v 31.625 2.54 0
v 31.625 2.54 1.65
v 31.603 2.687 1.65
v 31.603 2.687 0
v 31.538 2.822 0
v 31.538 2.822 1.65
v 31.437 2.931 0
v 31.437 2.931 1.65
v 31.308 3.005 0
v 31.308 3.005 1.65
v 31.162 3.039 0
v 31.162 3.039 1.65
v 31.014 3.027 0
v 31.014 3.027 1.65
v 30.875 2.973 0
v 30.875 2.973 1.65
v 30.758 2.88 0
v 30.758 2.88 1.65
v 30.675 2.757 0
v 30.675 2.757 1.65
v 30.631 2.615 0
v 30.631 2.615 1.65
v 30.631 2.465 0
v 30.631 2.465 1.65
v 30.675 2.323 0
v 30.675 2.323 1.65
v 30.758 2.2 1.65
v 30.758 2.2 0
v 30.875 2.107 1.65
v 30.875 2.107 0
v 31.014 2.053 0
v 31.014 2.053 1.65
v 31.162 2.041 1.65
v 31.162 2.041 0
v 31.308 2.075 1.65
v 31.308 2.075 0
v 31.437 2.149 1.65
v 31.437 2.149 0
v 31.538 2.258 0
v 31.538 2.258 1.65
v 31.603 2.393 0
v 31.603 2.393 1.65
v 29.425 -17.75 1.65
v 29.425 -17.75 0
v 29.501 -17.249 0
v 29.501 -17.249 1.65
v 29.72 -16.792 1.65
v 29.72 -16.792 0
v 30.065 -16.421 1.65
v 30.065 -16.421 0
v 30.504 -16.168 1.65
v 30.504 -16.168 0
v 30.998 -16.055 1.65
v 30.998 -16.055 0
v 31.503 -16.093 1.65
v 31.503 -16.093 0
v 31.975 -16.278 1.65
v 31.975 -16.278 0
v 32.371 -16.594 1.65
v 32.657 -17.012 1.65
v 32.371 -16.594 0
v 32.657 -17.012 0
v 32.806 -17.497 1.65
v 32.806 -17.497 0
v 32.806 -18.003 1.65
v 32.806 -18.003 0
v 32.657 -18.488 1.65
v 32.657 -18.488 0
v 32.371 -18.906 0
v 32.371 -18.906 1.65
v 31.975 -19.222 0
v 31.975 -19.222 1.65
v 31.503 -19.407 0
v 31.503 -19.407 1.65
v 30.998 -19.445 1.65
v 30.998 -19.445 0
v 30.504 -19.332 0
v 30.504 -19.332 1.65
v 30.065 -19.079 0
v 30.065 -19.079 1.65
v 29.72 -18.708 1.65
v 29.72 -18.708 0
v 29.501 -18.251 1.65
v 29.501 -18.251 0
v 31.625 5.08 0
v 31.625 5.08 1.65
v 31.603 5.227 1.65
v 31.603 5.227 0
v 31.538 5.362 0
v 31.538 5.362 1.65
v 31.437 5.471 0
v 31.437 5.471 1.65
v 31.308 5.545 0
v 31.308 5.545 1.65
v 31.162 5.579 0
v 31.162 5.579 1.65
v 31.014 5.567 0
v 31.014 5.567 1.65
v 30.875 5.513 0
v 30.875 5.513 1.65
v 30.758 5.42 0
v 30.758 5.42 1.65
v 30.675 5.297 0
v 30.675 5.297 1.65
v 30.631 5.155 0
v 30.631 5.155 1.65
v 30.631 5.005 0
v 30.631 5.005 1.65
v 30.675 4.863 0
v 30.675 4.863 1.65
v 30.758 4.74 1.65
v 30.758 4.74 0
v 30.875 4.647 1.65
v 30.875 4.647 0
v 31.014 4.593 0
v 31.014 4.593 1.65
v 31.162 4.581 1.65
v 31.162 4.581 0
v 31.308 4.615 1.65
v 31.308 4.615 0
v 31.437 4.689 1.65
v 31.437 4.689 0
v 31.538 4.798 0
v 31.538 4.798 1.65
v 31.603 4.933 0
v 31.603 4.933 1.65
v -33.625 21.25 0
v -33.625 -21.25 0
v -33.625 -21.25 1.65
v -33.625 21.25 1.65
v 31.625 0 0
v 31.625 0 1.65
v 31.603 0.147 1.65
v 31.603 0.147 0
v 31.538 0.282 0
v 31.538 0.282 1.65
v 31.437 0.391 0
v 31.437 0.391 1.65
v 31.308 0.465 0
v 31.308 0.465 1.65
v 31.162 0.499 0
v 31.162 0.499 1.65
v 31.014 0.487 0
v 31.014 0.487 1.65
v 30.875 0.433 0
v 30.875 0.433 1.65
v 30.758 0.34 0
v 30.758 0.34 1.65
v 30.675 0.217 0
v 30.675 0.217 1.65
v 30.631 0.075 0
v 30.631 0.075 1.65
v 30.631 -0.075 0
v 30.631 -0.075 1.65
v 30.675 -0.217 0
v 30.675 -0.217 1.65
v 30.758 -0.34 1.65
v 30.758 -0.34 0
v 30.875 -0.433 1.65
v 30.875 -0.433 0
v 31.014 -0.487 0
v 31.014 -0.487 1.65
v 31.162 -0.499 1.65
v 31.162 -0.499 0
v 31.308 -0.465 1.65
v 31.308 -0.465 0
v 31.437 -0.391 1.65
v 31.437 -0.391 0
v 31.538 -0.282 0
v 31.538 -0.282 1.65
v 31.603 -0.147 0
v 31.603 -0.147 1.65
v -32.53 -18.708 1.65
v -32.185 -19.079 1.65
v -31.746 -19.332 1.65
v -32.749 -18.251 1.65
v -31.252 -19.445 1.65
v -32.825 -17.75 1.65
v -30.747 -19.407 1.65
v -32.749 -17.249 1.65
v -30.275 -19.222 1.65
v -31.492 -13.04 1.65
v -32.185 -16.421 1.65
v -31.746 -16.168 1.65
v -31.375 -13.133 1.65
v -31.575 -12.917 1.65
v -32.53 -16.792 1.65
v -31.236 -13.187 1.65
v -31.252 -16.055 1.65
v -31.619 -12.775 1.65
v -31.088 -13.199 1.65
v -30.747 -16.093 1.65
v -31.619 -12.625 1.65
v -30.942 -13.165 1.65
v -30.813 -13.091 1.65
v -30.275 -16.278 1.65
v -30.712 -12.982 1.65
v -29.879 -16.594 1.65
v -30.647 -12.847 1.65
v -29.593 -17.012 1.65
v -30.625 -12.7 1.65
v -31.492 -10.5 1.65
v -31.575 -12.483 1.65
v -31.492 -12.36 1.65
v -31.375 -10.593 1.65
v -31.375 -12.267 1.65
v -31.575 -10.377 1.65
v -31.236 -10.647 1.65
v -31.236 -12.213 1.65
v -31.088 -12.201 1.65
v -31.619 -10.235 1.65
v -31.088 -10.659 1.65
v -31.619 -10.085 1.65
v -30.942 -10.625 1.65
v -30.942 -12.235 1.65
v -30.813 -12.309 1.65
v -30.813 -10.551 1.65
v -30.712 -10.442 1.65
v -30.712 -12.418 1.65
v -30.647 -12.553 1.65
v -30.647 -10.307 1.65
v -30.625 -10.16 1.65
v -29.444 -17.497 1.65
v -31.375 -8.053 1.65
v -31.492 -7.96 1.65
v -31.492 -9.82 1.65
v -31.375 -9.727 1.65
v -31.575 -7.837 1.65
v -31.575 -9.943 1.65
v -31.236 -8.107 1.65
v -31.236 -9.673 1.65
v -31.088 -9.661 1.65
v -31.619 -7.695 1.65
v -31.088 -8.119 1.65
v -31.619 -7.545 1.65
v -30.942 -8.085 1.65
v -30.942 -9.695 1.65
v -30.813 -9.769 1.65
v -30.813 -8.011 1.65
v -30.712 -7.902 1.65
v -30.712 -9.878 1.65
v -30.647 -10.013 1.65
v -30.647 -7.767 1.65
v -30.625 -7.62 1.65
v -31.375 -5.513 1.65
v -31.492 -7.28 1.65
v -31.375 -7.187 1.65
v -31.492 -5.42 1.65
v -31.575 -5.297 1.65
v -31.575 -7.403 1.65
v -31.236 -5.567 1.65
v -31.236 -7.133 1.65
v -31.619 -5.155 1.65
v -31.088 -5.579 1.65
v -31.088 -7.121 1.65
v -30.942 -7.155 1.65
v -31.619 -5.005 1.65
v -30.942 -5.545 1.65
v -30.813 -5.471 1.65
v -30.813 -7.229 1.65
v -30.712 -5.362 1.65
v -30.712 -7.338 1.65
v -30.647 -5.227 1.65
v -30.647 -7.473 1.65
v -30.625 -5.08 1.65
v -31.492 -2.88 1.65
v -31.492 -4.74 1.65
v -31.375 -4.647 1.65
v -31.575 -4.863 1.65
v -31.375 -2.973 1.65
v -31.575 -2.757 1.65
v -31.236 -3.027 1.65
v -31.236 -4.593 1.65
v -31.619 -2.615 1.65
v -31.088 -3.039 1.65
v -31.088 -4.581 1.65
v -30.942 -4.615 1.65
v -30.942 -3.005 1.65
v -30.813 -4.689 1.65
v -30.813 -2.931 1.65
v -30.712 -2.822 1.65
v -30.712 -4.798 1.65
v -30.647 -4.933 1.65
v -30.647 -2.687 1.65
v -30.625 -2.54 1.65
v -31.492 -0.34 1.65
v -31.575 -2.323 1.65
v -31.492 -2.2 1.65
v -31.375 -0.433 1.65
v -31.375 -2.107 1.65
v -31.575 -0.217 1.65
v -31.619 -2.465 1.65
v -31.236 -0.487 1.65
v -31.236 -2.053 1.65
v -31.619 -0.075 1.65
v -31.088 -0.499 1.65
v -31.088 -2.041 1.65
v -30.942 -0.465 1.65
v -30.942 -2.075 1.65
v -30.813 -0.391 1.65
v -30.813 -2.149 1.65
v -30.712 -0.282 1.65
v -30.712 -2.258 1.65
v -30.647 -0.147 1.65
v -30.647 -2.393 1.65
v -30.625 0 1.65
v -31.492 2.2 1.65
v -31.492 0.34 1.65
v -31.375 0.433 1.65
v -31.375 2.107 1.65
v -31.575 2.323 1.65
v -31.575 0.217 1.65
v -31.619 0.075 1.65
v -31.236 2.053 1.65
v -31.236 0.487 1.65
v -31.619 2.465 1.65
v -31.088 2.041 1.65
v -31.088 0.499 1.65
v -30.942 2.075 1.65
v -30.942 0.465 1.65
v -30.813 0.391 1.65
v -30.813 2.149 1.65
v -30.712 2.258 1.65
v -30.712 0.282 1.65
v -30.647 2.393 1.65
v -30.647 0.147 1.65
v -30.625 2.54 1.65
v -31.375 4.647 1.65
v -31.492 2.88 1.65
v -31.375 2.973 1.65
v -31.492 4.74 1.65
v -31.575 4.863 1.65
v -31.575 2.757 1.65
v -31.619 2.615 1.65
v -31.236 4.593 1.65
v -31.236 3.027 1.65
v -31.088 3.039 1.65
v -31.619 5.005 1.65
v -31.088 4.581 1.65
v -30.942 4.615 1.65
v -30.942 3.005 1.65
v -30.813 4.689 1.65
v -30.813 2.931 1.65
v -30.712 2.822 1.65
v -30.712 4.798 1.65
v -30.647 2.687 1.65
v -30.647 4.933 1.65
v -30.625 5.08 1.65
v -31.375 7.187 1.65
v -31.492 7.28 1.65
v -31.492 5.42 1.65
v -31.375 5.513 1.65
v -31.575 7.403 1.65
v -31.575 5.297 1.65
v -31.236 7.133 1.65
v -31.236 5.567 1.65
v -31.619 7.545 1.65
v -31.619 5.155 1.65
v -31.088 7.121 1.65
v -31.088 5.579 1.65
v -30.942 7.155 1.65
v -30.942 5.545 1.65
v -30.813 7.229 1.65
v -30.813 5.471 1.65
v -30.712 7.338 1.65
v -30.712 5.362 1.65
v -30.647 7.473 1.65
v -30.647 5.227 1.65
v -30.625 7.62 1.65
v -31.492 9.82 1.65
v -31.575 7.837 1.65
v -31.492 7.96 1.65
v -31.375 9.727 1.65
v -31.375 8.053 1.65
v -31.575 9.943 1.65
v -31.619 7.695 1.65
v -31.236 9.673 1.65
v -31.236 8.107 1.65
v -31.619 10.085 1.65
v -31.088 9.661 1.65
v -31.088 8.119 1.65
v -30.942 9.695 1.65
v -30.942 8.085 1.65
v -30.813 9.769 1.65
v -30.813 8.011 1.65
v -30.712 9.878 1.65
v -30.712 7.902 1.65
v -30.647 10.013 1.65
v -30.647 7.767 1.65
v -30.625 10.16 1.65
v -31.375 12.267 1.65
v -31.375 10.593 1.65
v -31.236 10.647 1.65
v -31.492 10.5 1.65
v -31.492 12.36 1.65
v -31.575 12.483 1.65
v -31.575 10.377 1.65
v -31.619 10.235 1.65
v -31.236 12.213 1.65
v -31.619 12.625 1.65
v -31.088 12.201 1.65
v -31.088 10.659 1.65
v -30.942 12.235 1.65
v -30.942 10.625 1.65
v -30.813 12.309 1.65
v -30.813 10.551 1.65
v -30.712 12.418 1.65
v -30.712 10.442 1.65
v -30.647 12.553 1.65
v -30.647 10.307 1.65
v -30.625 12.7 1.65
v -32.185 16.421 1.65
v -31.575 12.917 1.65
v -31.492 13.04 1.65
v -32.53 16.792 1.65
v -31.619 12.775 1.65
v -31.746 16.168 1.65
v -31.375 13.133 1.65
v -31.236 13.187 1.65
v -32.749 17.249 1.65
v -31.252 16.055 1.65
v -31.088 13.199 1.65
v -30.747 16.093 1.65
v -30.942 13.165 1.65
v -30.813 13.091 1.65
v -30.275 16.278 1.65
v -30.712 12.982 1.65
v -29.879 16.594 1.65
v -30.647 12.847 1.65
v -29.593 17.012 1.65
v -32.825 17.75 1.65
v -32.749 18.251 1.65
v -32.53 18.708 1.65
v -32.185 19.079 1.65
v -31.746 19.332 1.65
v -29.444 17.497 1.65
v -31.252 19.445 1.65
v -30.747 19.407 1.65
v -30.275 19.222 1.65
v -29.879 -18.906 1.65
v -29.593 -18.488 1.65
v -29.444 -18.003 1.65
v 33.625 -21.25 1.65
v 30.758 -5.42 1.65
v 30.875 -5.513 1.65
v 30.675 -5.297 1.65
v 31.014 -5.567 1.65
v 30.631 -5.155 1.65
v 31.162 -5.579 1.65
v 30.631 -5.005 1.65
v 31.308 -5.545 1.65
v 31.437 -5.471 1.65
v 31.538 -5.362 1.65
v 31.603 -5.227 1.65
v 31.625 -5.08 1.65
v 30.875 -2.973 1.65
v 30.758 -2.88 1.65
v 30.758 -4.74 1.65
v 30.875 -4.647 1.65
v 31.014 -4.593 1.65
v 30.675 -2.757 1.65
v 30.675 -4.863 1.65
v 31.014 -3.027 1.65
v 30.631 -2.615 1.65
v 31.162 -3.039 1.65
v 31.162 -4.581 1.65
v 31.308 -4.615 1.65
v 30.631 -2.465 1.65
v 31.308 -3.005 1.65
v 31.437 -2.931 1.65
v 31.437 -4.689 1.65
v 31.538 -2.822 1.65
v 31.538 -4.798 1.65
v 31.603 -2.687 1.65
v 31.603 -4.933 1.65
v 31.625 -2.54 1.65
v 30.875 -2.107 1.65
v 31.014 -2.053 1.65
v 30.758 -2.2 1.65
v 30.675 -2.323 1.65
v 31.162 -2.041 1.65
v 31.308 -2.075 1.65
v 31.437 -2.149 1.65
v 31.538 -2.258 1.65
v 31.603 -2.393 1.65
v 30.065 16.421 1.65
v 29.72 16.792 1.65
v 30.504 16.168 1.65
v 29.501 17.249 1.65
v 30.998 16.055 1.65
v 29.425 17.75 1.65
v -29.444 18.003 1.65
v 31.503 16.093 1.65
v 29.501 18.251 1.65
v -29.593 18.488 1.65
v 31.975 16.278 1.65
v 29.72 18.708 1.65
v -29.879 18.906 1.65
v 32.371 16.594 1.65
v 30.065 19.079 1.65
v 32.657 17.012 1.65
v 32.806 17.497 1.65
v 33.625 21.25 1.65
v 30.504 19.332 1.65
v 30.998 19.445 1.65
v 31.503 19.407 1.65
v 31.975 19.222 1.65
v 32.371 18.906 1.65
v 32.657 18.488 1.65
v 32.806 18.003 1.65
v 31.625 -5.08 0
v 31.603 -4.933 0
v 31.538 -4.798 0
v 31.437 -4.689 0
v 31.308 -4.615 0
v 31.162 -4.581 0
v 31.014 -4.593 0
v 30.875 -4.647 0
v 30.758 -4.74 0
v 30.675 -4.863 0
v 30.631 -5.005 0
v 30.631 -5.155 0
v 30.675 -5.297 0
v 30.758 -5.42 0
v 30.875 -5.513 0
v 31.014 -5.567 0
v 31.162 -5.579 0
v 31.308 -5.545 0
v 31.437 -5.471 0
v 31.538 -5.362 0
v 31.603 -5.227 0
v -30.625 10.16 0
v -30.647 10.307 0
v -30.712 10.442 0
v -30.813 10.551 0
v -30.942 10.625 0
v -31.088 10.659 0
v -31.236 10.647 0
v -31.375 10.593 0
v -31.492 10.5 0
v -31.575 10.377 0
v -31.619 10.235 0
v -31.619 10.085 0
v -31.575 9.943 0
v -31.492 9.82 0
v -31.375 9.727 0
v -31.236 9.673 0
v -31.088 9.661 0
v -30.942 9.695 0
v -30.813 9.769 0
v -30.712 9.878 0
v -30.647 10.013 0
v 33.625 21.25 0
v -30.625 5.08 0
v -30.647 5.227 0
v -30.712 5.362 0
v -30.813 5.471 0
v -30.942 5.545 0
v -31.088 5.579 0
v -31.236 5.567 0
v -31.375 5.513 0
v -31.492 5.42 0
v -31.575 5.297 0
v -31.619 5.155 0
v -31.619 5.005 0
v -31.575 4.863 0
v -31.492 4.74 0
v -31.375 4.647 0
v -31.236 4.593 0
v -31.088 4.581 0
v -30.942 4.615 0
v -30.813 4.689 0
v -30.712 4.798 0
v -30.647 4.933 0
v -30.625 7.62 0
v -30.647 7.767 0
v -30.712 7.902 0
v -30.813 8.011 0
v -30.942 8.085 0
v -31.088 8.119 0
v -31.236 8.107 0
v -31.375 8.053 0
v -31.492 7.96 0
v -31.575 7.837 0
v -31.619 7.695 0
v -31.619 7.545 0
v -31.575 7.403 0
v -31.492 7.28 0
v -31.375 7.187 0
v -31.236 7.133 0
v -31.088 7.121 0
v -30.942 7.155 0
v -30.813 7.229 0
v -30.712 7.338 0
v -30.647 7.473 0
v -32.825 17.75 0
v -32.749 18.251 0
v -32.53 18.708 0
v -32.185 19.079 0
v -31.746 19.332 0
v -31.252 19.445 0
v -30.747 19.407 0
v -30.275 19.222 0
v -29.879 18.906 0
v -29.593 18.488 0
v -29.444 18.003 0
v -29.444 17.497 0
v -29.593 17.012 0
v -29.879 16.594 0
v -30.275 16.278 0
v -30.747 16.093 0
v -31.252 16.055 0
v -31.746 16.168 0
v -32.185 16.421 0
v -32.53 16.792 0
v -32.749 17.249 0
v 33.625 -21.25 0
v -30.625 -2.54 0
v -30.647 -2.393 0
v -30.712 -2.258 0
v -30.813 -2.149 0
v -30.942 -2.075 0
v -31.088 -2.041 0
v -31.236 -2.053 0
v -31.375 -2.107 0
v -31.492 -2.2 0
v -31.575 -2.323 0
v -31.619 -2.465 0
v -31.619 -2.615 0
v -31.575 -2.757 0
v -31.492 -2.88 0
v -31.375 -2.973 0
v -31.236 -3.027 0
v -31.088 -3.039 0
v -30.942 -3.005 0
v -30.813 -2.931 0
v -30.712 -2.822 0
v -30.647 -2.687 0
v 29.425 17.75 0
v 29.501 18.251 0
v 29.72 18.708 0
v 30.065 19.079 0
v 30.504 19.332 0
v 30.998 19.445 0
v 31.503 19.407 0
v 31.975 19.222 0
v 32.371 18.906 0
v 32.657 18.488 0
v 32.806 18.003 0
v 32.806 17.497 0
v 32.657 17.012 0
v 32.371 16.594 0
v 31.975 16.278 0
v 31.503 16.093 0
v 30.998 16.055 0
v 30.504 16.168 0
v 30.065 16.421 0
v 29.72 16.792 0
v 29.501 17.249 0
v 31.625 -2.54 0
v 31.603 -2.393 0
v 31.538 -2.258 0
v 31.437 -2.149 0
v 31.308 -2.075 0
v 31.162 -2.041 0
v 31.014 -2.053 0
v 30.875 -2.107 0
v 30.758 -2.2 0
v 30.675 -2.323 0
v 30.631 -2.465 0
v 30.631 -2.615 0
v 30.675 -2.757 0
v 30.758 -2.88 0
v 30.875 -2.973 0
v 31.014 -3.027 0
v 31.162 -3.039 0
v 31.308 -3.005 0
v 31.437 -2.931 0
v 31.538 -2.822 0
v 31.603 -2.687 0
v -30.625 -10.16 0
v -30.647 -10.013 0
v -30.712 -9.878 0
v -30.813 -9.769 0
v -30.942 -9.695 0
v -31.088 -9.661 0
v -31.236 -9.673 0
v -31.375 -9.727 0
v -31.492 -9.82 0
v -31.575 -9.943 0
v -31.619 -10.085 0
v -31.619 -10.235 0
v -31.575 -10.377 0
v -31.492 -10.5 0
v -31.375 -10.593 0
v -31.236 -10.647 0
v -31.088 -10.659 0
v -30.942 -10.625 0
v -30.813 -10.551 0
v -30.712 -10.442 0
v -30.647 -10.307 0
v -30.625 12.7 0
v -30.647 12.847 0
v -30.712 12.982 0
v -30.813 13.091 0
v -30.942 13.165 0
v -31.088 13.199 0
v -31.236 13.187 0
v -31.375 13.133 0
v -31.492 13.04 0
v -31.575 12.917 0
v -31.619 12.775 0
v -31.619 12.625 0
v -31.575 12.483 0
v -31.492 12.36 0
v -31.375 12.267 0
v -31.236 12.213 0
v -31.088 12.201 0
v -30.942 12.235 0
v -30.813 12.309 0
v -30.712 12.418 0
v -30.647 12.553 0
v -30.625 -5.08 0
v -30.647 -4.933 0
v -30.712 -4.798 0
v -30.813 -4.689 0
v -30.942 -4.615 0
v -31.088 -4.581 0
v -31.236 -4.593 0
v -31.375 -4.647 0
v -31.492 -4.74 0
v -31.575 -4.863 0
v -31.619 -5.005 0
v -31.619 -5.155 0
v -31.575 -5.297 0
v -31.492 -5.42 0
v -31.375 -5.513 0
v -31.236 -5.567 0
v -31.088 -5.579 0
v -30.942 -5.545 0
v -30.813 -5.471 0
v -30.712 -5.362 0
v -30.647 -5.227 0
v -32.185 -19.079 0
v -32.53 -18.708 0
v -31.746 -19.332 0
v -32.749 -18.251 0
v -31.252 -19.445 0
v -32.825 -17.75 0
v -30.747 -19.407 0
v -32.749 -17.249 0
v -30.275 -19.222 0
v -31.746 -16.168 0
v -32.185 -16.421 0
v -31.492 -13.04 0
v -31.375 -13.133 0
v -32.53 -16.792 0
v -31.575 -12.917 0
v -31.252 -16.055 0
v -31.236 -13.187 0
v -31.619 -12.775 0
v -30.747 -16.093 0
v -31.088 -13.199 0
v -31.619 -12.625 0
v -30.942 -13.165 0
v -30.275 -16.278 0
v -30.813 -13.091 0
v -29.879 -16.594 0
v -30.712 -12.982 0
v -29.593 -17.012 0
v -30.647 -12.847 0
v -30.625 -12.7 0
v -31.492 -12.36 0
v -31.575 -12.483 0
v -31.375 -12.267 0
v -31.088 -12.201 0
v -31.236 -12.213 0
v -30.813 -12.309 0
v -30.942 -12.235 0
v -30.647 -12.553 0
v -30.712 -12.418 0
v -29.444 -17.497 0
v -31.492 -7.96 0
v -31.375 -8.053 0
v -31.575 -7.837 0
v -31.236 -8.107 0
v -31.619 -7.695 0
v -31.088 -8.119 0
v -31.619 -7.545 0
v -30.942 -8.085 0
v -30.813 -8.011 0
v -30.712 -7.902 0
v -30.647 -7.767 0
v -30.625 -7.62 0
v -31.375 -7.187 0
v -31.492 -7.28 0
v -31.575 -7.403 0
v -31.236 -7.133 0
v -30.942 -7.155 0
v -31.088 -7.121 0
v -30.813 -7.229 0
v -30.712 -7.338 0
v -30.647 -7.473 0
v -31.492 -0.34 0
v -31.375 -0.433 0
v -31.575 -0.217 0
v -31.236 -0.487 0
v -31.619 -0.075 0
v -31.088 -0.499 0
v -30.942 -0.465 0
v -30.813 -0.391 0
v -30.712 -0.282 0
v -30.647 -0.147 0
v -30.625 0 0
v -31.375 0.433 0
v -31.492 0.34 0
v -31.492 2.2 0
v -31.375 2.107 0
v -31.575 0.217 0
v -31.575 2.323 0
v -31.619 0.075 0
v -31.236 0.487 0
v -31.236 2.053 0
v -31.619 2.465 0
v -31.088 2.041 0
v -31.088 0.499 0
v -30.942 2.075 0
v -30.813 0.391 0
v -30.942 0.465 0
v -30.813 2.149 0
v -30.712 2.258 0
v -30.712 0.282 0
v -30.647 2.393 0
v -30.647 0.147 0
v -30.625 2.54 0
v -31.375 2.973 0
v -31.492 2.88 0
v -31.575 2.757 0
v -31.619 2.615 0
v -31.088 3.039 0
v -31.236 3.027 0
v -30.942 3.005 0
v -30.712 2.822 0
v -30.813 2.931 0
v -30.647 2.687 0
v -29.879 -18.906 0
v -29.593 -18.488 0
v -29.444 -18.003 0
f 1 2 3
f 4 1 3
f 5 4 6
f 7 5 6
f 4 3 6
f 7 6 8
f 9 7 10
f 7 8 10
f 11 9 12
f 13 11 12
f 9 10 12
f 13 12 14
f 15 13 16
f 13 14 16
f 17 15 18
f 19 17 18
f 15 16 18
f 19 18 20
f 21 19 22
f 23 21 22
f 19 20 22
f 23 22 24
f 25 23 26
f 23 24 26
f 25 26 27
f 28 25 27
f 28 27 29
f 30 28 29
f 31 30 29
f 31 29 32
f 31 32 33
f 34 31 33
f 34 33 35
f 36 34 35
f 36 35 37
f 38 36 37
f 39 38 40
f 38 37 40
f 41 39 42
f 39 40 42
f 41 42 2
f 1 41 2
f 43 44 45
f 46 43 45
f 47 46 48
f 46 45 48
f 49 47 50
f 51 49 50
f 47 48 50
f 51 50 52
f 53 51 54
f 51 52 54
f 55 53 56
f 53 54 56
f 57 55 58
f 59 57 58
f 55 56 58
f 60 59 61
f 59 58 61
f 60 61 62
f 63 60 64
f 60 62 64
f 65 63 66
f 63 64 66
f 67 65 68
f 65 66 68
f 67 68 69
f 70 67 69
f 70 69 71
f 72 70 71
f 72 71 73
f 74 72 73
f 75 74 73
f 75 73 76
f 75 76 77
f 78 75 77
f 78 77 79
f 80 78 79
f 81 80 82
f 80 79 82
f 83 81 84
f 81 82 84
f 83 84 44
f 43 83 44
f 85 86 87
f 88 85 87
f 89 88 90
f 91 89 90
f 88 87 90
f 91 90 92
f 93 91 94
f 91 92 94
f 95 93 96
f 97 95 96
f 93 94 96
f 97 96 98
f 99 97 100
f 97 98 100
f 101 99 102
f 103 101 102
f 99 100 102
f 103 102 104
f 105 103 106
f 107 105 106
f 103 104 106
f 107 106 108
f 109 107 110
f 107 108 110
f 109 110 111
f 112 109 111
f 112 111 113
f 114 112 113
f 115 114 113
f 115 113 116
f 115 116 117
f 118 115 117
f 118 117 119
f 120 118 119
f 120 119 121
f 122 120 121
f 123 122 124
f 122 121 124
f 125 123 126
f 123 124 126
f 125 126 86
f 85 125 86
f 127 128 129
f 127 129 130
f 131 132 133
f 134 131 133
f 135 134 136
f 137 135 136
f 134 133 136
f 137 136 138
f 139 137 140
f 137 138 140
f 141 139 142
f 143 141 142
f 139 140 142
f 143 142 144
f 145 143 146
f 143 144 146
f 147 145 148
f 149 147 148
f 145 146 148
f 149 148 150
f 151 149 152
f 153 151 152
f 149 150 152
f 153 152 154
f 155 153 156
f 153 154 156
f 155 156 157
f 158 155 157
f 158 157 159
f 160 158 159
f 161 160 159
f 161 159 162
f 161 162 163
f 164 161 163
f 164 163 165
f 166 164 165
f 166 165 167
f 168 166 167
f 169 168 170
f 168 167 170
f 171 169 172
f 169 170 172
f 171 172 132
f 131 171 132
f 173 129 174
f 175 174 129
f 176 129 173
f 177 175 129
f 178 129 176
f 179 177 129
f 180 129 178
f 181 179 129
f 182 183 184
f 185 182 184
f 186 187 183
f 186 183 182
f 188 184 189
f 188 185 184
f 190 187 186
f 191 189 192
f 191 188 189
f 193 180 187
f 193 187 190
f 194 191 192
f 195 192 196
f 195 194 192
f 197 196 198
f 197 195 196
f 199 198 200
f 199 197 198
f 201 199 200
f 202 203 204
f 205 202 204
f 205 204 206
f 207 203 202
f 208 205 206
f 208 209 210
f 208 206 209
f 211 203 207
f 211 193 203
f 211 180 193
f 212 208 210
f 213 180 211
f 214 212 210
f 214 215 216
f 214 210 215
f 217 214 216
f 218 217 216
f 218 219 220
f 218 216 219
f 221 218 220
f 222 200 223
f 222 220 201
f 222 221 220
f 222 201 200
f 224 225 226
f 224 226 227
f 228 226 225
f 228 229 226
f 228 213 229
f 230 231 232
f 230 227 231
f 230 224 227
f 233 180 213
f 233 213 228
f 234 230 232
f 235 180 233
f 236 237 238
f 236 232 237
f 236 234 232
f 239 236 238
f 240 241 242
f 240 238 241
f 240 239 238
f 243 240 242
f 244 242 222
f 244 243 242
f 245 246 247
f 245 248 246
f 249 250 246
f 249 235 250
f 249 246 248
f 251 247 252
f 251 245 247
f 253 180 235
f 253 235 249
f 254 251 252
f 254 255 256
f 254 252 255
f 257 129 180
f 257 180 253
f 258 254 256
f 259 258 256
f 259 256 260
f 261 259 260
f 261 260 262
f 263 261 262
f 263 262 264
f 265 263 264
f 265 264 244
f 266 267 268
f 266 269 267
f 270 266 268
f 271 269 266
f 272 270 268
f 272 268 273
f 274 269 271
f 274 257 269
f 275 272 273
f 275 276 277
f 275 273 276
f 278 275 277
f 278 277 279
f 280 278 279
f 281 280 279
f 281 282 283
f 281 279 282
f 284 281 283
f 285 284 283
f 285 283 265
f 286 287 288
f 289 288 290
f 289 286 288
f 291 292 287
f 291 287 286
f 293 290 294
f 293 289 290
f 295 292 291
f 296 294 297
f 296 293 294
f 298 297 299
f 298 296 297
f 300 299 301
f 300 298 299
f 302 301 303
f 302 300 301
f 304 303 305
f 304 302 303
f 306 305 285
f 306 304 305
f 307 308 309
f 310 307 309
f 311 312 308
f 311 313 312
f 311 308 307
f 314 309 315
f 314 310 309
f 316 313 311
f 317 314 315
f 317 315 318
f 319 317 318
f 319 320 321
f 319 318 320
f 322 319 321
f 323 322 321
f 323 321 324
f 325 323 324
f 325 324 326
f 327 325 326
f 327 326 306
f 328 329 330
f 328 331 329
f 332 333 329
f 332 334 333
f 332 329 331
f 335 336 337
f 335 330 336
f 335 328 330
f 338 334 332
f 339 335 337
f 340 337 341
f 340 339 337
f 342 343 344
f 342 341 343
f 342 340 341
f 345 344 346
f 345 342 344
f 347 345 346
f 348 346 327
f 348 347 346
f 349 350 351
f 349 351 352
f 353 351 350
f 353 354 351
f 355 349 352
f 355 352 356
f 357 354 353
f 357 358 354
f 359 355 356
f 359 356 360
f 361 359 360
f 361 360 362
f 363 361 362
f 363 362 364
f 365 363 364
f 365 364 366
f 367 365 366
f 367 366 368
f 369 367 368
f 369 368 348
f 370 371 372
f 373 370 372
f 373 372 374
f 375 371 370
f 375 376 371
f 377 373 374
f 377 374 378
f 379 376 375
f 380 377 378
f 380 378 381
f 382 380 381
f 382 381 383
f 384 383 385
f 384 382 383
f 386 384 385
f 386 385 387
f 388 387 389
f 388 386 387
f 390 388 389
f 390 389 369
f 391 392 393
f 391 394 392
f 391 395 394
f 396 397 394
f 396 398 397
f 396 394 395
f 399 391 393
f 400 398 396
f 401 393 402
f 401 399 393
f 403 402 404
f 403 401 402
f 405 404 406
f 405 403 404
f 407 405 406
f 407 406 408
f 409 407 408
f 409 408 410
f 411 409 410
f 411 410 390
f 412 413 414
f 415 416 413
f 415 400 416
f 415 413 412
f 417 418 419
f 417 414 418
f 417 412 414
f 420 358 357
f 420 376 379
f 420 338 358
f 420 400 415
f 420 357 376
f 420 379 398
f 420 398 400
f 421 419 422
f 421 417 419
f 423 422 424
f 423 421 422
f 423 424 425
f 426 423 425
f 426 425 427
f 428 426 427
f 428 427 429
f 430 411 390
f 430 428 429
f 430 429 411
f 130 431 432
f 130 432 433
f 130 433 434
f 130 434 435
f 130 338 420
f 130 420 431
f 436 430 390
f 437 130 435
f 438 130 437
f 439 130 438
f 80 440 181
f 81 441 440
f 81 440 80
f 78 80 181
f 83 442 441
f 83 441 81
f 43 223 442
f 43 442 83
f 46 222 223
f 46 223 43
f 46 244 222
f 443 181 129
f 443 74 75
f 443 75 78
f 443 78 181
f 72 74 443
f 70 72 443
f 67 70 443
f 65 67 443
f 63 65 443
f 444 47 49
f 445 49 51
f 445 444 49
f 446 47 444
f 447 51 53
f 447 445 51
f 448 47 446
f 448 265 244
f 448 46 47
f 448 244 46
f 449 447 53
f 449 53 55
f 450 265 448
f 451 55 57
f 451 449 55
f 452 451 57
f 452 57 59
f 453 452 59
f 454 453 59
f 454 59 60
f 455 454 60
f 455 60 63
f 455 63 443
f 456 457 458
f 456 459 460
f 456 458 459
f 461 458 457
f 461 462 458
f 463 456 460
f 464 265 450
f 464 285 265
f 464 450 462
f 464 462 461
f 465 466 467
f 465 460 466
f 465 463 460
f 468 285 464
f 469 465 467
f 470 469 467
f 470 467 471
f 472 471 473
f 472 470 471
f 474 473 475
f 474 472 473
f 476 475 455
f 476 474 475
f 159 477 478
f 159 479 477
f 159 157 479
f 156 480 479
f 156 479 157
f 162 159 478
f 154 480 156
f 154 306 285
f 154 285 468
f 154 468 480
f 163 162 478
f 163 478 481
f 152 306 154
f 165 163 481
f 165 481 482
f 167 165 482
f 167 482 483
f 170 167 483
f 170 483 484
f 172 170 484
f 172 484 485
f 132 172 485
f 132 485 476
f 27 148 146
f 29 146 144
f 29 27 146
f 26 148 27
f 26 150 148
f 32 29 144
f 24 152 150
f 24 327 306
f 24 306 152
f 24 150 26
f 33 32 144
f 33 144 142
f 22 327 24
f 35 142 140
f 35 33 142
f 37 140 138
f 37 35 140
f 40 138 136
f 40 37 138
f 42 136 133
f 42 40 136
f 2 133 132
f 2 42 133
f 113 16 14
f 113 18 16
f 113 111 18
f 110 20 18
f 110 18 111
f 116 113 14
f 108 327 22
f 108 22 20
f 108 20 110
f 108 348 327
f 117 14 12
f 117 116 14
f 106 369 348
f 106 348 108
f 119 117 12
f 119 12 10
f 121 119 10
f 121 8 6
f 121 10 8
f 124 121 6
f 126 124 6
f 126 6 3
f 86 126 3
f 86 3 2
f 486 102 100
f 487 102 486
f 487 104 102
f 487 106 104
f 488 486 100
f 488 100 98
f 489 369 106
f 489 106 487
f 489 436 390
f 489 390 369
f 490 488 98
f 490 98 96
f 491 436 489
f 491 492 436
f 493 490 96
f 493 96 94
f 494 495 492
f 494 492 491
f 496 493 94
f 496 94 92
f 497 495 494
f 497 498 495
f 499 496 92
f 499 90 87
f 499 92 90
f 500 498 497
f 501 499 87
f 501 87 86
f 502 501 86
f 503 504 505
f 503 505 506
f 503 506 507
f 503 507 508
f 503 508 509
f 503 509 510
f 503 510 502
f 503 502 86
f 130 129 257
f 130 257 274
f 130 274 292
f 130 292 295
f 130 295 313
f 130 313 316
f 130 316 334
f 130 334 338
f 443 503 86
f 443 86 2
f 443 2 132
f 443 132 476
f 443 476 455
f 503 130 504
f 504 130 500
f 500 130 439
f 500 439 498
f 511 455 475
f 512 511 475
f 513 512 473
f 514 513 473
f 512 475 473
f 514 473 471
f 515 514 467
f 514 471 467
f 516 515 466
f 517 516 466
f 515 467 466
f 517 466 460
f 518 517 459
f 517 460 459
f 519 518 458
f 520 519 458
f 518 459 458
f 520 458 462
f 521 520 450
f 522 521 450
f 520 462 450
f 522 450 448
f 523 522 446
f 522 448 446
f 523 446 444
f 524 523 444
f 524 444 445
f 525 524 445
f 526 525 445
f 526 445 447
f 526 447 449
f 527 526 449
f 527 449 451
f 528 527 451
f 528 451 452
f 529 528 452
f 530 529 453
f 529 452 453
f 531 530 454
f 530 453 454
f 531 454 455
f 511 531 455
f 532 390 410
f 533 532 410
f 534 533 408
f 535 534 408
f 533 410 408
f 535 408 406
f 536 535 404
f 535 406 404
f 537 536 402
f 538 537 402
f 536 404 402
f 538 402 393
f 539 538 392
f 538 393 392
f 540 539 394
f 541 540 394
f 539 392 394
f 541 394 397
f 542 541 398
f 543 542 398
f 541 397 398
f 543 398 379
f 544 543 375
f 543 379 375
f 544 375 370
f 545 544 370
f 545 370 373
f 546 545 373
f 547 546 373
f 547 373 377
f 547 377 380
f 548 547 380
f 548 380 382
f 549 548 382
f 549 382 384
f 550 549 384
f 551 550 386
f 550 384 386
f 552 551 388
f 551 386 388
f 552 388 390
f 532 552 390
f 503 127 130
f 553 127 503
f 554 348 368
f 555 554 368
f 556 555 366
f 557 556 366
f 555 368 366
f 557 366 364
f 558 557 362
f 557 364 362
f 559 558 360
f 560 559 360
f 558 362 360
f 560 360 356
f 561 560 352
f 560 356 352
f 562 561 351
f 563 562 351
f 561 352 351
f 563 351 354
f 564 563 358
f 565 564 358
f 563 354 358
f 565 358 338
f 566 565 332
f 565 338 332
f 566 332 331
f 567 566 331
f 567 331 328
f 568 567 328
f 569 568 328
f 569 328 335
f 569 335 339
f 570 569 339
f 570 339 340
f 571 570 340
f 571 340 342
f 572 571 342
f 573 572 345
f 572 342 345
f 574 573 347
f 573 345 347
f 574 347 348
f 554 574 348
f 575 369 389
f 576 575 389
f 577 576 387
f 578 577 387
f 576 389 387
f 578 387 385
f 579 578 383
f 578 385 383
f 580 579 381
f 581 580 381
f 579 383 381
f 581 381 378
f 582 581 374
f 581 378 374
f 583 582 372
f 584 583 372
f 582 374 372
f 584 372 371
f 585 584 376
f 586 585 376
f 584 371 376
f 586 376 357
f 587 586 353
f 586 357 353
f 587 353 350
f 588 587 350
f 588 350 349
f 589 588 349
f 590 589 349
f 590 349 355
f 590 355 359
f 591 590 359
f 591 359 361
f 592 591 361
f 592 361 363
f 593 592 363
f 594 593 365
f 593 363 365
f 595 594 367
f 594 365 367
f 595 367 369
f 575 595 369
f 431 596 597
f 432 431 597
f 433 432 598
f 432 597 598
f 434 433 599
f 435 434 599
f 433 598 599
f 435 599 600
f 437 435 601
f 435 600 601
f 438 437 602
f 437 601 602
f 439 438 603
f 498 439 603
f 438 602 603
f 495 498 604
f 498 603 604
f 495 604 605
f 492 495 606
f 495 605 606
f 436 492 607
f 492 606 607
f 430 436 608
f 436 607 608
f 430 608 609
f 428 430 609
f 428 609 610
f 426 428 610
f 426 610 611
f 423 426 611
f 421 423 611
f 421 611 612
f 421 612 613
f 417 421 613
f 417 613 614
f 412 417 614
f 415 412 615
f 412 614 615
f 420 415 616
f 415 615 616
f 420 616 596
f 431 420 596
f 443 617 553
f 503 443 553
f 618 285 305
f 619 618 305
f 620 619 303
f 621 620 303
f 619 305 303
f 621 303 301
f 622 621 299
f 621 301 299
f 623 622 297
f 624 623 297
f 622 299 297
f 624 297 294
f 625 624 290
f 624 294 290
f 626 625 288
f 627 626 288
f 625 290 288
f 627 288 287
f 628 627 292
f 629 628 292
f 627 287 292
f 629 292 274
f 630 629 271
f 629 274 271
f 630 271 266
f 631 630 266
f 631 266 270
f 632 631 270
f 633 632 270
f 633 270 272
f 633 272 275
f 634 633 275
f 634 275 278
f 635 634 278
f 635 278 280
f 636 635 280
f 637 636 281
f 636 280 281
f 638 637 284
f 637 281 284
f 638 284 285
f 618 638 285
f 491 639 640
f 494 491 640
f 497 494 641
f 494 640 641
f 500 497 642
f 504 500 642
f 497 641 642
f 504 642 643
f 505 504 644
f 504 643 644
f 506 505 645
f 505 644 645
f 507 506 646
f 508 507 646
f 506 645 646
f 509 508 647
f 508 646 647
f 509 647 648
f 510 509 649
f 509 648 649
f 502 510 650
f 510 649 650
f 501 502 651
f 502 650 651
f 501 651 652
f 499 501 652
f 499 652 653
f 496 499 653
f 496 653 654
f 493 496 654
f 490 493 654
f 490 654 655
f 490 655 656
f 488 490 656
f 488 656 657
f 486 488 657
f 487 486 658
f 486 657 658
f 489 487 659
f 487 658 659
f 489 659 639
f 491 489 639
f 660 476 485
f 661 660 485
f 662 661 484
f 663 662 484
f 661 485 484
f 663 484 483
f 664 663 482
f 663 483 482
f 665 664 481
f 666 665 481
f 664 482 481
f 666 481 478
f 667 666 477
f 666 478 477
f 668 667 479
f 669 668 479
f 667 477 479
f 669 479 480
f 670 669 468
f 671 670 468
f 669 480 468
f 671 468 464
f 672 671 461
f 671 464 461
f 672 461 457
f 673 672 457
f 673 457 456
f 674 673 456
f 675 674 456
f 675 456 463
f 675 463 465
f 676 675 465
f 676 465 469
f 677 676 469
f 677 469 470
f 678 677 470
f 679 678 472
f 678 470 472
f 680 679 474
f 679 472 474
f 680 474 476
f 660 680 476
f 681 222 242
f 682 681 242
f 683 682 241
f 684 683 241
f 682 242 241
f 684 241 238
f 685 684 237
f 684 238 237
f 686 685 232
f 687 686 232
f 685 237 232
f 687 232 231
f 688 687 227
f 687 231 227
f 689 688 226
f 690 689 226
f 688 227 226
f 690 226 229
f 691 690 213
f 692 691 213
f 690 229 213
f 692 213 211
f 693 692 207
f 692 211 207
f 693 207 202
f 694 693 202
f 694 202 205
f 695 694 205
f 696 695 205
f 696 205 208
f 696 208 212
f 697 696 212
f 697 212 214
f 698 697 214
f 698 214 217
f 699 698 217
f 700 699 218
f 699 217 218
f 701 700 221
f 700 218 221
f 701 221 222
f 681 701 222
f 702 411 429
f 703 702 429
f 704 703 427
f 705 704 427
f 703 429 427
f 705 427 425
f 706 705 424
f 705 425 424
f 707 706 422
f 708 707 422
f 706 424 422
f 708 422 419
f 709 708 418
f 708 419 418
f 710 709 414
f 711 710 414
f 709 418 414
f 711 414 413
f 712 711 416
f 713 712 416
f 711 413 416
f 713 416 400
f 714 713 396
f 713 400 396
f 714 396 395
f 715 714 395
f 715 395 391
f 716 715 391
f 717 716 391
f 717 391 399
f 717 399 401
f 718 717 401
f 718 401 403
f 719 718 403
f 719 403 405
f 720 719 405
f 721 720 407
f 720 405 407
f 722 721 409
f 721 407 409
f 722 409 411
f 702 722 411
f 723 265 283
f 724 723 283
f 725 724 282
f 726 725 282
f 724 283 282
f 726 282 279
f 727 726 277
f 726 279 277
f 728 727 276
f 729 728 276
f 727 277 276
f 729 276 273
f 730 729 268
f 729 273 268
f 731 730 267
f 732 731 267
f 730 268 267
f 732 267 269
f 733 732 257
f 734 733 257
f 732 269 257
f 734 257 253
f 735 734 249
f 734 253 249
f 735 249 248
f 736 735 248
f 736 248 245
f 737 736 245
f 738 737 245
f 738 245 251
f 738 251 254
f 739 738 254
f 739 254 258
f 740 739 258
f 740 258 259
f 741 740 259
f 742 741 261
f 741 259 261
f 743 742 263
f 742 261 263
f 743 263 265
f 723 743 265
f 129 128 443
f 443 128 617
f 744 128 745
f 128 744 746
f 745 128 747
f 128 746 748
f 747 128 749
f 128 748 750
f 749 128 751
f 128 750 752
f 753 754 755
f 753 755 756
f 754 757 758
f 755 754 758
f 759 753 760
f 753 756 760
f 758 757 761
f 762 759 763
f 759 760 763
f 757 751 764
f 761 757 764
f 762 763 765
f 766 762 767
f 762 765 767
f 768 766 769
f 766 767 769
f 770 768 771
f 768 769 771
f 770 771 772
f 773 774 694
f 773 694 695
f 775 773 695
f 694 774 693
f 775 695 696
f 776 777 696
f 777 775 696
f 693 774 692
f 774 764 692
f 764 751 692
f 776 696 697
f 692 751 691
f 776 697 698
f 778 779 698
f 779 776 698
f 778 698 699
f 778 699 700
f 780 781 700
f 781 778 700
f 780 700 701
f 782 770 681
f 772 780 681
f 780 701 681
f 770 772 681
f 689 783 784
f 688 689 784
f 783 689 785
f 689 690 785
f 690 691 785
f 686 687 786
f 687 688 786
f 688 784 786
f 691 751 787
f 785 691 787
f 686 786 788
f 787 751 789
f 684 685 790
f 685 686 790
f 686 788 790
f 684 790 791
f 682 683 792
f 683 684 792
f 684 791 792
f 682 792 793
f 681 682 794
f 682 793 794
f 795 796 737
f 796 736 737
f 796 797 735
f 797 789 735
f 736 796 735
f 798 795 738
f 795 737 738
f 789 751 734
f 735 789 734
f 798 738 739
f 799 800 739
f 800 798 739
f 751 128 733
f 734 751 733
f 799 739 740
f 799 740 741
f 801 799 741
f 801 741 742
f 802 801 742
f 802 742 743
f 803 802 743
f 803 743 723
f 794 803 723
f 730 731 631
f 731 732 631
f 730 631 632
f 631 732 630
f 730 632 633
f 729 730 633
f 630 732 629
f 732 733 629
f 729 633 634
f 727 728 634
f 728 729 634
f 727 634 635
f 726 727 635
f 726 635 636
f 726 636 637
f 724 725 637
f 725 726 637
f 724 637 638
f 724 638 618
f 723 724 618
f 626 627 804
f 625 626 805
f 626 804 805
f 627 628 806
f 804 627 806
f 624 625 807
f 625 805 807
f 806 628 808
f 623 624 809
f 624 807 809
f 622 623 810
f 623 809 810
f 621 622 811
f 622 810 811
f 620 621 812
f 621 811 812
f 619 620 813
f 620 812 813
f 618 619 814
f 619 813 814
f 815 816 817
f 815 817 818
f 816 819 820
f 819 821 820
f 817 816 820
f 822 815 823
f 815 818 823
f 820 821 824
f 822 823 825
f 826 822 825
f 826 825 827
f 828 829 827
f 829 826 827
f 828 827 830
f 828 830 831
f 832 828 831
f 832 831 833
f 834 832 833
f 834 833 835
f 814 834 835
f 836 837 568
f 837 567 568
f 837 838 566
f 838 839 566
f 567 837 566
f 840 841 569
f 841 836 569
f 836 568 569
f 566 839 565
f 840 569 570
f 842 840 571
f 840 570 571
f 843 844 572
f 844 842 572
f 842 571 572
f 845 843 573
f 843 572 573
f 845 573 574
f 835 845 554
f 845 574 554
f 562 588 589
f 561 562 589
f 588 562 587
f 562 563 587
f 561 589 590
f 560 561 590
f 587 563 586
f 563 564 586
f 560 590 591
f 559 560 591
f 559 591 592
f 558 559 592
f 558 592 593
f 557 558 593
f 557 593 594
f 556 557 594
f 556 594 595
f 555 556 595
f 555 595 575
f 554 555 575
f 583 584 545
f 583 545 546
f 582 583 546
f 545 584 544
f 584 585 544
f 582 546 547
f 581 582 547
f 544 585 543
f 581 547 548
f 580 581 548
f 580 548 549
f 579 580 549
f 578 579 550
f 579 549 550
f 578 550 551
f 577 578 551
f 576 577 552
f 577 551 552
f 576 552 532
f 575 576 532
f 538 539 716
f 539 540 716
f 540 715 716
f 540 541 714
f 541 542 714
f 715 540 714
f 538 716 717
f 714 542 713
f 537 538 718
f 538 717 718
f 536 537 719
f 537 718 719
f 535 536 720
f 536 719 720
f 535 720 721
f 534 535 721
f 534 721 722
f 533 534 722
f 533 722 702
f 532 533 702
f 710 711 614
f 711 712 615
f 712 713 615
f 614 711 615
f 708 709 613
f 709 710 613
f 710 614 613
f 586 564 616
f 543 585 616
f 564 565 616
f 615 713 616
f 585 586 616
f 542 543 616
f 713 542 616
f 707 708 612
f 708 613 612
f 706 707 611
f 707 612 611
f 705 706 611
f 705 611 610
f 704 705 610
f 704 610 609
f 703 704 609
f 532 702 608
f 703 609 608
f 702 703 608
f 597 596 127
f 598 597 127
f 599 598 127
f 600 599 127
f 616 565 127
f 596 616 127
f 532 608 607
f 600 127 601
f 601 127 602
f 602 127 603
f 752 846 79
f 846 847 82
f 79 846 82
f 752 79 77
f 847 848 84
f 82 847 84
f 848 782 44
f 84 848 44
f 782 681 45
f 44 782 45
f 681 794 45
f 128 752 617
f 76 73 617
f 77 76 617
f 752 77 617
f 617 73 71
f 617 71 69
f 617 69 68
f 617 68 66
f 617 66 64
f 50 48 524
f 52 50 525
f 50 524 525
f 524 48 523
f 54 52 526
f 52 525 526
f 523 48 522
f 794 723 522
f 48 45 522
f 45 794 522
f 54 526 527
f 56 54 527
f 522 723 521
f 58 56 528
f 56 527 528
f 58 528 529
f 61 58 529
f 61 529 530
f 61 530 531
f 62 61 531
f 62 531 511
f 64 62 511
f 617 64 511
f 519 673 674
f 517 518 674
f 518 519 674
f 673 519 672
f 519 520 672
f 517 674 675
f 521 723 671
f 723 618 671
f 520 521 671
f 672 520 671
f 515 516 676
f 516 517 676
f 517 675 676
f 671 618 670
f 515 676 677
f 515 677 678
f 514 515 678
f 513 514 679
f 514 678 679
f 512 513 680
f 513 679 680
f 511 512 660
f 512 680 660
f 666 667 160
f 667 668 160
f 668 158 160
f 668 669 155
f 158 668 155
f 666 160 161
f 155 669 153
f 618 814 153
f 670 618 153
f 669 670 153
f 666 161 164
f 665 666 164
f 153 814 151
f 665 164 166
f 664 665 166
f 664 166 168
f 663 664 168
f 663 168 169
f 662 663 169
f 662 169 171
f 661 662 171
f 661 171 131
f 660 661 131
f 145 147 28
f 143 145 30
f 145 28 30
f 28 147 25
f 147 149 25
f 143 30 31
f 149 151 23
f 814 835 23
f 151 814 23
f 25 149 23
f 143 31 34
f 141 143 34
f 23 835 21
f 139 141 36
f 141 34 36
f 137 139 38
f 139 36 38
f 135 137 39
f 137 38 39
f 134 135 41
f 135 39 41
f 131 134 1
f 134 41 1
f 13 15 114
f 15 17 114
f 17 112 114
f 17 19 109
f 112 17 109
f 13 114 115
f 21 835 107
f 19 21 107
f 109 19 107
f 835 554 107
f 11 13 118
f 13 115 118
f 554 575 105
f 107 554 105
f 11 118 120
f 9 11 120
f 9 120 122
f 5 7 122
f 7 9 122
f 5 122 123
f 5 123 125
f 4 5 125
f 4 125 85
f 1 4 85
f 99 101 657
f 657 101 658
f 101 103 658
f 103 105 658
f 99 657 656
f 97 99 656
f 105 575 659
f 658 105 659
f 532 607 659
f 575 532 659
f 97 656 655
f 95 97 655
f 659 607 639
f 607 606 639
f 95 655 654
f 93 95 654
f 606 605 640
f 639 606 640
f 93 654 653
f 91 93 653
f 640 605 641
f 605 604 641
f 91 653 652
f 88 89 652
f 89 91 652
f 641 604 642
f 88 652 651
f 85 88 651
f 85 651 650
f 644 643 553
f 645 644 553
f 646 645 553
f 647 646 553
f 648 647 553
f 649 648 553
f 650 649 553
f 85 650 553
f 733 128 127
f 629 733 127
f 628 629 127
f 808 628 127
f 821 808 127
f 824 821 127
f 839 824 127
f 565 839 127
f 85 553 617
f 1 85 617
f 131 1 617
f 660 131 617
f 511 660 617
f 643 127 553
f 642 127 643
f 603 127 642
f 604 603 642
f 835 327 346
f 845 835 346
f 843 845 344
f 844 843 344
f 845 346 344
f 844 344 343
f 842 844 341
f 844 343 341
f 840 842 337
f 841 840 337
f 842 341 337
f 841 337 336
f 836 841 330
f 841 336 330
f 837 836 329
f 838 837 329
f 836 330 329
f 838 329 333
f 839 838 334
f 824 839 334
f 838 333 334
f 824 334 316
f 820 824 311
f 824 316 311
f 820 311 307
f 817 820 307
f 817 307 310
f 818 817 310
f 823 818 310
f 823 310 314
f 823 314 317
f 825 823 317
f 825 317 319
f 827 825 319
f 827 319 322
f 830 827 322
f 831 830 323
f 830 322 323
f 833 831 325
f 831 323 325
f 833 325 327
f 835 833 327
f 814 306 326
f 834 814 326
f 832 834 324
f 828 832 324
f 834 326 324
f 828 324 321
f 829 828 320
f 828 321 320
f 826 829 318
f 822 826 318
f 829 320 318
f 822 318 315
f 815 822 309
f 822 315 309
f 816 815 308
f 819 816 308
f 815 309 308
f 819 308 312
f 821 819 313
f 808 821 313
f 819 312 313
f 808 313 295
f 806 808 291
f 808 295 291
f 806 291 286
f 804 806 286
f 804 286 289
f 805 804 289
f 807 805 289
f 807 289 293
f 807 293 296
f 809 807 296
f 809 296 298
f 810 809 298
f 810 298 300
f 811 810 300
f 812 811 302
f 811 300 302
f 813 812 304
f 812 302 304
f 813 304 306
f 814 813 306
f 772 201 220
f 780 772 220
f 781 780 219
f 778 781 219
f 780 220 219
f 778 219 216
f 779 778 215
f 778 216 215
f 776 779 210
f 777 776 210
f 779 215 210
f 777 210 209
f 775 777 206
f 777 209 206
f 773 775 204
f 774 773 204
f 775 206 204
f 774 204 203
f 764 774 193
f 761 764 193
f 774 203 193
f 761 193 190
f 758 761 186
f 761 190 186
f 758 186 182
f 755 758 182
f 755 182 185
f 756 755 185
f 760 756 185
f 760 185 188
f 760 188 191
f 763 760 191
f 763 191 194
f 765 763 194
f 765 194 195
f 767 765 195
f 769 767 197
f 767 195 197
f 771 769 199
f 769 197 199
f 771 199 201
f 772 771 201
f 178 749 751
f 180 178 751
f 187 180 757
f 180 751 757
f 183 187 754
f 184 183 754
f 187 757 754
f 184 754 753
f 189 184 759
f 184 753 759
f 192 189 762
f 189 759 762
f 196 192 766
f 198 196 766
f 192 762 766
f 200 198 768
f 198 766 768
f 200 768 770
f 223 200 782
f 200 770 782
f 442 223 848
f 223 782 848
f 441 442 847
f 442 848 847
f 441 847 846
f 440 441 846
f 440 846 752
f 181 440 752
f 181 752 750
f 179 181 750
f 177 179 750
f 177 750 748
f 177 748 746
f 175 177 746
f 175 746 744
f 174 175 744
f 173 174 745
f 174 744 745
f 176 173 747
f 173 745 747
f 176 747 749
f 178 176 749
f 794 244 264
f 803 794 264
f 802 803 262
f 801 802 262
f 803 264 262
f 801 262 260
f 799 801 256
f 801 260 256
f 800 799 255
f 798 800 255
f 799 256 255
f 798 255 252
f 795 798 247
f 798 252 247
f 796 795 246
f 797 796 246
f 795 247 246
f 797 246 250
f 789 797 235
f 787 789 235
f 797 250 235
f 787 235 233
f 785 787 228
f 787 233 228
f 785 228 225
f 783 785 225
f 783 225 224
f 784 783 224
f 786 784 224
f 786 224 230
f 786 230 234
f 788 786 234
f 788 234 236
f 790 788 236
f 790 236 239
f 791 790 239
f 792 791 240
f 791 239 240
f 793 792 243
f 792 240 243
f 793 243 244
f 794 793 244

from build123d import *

# Parameters (mm, degrees)
SKETCH2_W           = 67.25
SKETCH2_H           = 42.5
BOSS_EXTRUDE1_DEPTH = 1.65
SKETCH3_R           = 1.7
CUT_EXTRUDE1_DEPTH  = 1.65
SKETCH5_R           = 0.5
CUT_EXTRUDE2_DEPTH  = 1.65
SKETCH8_R           = 0.5
CUT_EXTRUDE3_DEPTH  = 1.65


with BuildPart() as part:
    # Sketch2 → Boss-Extrude1 (new body)
    with BuildSketch(Plane.XY):
        Rectangle(SKETCH2_W, SKETCH2_H)
    extrude(amount=BOSS_EXTRUDE1_DEPTH)

    # Sketch3 → Cut-Extrude1 (cut)
    with BuildSketch(Plane(origin=(0, 0, 0), x_dir=(-1, 0, 0), z_dir=(0, 0, -1))):
        with Locations((31.125, -17.75)):
            Circle(SKETCH3_R)
        with Locations((31.125, 17.75)):
            Circle(SKETCH3_R)
        with Locations((-31.125, -17.75)):
            Circle(SKETCH3_R)
        with Locations((-31.125, 17.75)):
            Circle(SKETCH3_R)
    extrude(amount=-CUT_EXTRUDE1_DEPTH, mode=Mode.SUBTRACT)

    # Sketch5 → Cut-Extrude2 (cut)
    with BuildSketch(Plane.XY.offset(1.65)):
        with Locations((-31.125, 0)):
            Circle(SKETCH5_R)
        with Locations((-31.125, -2.54)):
            Circle(SKETCH5_R)
        with Locations((-31.125, -5.08)):
            Circle(SKETCH5_R)
        with Locations((-31.125, -7.62)):
            Circle(SKETCH5_R)
        with Locations((-31.125, -10.16)):
            Circle(SKETCH5_R)
        with Locations((-31.125, -12.7)):
            Circle(SKETCH5_R)
        with Locations((-31.125, 2.54)):
            Circle(SKETCH5_R)
        with Locations((-31.125, 5.08)):
            Circle(SKETCH5_R)
        with Locations((-31.125, 7.62)):
            Circle(SKETCH5_R)
        with Locations((-31.125, 10.16)):
            Circle(SKETCH5_R)
        with Locations((-31.125, 12.7)):
            Circle(SKETCH5_R)
    extrude(amount=-CUT_EXTRUDE2_DEPTH, mode=Mode.SUBTRACT)

    # Sketch8 → Cut-Extrude3 (cut)
    with BuildSketch(Plane.XY.offset(1.65)):
        with Locations((31.125, 0)):
            Circle(SKETCH8_R)
        with Locations((31.125, 2.54)):
            Circle(SKETCH8_R)
        with Locations((31.125, 5.08)):
            Circle(SKETCH8_R)
        with Locations((31.125, -2.54)):
            Circle(SKETCH8_R)
        with Locations((31.125, -5.08)):
            Circle(SKETCH8_R)
    extrude(amount=-CUT_EXTRUDE3_DEPTH, mode=Mode.SUBTRACT)


solid = part.part
